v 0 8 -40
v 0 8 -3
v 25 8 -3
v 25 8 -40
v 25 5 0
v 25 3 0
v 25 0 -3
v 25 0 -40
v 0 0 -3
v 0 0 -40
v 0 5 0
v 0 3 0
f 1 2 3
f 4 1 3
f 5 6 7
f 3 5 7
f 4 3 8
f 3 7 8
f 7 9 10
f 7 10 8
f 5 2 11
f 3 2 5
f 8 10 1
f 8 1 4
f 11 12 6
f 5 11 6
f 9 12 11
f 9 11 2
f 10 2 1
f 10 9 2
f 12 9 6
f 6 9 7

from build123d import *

# Parameters (mm, degrees)
SKETCH_1_W      = 25
SKETCH_1_H      = 40
EXTRUDE_1_DEPTH = 8
CHAMFER_1_SIZE  = 3


with BuildPart() as part:
    # 草图1 → 凸台-拉伸1 (new body)
    with BuildSketch(Plane(origin=(0, 0, 0), x_dir=(1, 0, 0), z_dir=(0, 1, 0))):
        with Locations((12.5, 20)):
            Rectangle(SKETCH_1_W, SKETCH_1_H)
    extrude(amount=EXTRUDE_1_DEPTH)

    # 倒角1
    chamfer_1_edges = [part.edges().sort_by_distance(p)[0] for p in [
        (12.5, 0, 0),
        (12.5, 8, 0),
    ]]
    chamfer(chamfer_1_edges, length=CHAMFER_1_SIZE)


solid = part.part
